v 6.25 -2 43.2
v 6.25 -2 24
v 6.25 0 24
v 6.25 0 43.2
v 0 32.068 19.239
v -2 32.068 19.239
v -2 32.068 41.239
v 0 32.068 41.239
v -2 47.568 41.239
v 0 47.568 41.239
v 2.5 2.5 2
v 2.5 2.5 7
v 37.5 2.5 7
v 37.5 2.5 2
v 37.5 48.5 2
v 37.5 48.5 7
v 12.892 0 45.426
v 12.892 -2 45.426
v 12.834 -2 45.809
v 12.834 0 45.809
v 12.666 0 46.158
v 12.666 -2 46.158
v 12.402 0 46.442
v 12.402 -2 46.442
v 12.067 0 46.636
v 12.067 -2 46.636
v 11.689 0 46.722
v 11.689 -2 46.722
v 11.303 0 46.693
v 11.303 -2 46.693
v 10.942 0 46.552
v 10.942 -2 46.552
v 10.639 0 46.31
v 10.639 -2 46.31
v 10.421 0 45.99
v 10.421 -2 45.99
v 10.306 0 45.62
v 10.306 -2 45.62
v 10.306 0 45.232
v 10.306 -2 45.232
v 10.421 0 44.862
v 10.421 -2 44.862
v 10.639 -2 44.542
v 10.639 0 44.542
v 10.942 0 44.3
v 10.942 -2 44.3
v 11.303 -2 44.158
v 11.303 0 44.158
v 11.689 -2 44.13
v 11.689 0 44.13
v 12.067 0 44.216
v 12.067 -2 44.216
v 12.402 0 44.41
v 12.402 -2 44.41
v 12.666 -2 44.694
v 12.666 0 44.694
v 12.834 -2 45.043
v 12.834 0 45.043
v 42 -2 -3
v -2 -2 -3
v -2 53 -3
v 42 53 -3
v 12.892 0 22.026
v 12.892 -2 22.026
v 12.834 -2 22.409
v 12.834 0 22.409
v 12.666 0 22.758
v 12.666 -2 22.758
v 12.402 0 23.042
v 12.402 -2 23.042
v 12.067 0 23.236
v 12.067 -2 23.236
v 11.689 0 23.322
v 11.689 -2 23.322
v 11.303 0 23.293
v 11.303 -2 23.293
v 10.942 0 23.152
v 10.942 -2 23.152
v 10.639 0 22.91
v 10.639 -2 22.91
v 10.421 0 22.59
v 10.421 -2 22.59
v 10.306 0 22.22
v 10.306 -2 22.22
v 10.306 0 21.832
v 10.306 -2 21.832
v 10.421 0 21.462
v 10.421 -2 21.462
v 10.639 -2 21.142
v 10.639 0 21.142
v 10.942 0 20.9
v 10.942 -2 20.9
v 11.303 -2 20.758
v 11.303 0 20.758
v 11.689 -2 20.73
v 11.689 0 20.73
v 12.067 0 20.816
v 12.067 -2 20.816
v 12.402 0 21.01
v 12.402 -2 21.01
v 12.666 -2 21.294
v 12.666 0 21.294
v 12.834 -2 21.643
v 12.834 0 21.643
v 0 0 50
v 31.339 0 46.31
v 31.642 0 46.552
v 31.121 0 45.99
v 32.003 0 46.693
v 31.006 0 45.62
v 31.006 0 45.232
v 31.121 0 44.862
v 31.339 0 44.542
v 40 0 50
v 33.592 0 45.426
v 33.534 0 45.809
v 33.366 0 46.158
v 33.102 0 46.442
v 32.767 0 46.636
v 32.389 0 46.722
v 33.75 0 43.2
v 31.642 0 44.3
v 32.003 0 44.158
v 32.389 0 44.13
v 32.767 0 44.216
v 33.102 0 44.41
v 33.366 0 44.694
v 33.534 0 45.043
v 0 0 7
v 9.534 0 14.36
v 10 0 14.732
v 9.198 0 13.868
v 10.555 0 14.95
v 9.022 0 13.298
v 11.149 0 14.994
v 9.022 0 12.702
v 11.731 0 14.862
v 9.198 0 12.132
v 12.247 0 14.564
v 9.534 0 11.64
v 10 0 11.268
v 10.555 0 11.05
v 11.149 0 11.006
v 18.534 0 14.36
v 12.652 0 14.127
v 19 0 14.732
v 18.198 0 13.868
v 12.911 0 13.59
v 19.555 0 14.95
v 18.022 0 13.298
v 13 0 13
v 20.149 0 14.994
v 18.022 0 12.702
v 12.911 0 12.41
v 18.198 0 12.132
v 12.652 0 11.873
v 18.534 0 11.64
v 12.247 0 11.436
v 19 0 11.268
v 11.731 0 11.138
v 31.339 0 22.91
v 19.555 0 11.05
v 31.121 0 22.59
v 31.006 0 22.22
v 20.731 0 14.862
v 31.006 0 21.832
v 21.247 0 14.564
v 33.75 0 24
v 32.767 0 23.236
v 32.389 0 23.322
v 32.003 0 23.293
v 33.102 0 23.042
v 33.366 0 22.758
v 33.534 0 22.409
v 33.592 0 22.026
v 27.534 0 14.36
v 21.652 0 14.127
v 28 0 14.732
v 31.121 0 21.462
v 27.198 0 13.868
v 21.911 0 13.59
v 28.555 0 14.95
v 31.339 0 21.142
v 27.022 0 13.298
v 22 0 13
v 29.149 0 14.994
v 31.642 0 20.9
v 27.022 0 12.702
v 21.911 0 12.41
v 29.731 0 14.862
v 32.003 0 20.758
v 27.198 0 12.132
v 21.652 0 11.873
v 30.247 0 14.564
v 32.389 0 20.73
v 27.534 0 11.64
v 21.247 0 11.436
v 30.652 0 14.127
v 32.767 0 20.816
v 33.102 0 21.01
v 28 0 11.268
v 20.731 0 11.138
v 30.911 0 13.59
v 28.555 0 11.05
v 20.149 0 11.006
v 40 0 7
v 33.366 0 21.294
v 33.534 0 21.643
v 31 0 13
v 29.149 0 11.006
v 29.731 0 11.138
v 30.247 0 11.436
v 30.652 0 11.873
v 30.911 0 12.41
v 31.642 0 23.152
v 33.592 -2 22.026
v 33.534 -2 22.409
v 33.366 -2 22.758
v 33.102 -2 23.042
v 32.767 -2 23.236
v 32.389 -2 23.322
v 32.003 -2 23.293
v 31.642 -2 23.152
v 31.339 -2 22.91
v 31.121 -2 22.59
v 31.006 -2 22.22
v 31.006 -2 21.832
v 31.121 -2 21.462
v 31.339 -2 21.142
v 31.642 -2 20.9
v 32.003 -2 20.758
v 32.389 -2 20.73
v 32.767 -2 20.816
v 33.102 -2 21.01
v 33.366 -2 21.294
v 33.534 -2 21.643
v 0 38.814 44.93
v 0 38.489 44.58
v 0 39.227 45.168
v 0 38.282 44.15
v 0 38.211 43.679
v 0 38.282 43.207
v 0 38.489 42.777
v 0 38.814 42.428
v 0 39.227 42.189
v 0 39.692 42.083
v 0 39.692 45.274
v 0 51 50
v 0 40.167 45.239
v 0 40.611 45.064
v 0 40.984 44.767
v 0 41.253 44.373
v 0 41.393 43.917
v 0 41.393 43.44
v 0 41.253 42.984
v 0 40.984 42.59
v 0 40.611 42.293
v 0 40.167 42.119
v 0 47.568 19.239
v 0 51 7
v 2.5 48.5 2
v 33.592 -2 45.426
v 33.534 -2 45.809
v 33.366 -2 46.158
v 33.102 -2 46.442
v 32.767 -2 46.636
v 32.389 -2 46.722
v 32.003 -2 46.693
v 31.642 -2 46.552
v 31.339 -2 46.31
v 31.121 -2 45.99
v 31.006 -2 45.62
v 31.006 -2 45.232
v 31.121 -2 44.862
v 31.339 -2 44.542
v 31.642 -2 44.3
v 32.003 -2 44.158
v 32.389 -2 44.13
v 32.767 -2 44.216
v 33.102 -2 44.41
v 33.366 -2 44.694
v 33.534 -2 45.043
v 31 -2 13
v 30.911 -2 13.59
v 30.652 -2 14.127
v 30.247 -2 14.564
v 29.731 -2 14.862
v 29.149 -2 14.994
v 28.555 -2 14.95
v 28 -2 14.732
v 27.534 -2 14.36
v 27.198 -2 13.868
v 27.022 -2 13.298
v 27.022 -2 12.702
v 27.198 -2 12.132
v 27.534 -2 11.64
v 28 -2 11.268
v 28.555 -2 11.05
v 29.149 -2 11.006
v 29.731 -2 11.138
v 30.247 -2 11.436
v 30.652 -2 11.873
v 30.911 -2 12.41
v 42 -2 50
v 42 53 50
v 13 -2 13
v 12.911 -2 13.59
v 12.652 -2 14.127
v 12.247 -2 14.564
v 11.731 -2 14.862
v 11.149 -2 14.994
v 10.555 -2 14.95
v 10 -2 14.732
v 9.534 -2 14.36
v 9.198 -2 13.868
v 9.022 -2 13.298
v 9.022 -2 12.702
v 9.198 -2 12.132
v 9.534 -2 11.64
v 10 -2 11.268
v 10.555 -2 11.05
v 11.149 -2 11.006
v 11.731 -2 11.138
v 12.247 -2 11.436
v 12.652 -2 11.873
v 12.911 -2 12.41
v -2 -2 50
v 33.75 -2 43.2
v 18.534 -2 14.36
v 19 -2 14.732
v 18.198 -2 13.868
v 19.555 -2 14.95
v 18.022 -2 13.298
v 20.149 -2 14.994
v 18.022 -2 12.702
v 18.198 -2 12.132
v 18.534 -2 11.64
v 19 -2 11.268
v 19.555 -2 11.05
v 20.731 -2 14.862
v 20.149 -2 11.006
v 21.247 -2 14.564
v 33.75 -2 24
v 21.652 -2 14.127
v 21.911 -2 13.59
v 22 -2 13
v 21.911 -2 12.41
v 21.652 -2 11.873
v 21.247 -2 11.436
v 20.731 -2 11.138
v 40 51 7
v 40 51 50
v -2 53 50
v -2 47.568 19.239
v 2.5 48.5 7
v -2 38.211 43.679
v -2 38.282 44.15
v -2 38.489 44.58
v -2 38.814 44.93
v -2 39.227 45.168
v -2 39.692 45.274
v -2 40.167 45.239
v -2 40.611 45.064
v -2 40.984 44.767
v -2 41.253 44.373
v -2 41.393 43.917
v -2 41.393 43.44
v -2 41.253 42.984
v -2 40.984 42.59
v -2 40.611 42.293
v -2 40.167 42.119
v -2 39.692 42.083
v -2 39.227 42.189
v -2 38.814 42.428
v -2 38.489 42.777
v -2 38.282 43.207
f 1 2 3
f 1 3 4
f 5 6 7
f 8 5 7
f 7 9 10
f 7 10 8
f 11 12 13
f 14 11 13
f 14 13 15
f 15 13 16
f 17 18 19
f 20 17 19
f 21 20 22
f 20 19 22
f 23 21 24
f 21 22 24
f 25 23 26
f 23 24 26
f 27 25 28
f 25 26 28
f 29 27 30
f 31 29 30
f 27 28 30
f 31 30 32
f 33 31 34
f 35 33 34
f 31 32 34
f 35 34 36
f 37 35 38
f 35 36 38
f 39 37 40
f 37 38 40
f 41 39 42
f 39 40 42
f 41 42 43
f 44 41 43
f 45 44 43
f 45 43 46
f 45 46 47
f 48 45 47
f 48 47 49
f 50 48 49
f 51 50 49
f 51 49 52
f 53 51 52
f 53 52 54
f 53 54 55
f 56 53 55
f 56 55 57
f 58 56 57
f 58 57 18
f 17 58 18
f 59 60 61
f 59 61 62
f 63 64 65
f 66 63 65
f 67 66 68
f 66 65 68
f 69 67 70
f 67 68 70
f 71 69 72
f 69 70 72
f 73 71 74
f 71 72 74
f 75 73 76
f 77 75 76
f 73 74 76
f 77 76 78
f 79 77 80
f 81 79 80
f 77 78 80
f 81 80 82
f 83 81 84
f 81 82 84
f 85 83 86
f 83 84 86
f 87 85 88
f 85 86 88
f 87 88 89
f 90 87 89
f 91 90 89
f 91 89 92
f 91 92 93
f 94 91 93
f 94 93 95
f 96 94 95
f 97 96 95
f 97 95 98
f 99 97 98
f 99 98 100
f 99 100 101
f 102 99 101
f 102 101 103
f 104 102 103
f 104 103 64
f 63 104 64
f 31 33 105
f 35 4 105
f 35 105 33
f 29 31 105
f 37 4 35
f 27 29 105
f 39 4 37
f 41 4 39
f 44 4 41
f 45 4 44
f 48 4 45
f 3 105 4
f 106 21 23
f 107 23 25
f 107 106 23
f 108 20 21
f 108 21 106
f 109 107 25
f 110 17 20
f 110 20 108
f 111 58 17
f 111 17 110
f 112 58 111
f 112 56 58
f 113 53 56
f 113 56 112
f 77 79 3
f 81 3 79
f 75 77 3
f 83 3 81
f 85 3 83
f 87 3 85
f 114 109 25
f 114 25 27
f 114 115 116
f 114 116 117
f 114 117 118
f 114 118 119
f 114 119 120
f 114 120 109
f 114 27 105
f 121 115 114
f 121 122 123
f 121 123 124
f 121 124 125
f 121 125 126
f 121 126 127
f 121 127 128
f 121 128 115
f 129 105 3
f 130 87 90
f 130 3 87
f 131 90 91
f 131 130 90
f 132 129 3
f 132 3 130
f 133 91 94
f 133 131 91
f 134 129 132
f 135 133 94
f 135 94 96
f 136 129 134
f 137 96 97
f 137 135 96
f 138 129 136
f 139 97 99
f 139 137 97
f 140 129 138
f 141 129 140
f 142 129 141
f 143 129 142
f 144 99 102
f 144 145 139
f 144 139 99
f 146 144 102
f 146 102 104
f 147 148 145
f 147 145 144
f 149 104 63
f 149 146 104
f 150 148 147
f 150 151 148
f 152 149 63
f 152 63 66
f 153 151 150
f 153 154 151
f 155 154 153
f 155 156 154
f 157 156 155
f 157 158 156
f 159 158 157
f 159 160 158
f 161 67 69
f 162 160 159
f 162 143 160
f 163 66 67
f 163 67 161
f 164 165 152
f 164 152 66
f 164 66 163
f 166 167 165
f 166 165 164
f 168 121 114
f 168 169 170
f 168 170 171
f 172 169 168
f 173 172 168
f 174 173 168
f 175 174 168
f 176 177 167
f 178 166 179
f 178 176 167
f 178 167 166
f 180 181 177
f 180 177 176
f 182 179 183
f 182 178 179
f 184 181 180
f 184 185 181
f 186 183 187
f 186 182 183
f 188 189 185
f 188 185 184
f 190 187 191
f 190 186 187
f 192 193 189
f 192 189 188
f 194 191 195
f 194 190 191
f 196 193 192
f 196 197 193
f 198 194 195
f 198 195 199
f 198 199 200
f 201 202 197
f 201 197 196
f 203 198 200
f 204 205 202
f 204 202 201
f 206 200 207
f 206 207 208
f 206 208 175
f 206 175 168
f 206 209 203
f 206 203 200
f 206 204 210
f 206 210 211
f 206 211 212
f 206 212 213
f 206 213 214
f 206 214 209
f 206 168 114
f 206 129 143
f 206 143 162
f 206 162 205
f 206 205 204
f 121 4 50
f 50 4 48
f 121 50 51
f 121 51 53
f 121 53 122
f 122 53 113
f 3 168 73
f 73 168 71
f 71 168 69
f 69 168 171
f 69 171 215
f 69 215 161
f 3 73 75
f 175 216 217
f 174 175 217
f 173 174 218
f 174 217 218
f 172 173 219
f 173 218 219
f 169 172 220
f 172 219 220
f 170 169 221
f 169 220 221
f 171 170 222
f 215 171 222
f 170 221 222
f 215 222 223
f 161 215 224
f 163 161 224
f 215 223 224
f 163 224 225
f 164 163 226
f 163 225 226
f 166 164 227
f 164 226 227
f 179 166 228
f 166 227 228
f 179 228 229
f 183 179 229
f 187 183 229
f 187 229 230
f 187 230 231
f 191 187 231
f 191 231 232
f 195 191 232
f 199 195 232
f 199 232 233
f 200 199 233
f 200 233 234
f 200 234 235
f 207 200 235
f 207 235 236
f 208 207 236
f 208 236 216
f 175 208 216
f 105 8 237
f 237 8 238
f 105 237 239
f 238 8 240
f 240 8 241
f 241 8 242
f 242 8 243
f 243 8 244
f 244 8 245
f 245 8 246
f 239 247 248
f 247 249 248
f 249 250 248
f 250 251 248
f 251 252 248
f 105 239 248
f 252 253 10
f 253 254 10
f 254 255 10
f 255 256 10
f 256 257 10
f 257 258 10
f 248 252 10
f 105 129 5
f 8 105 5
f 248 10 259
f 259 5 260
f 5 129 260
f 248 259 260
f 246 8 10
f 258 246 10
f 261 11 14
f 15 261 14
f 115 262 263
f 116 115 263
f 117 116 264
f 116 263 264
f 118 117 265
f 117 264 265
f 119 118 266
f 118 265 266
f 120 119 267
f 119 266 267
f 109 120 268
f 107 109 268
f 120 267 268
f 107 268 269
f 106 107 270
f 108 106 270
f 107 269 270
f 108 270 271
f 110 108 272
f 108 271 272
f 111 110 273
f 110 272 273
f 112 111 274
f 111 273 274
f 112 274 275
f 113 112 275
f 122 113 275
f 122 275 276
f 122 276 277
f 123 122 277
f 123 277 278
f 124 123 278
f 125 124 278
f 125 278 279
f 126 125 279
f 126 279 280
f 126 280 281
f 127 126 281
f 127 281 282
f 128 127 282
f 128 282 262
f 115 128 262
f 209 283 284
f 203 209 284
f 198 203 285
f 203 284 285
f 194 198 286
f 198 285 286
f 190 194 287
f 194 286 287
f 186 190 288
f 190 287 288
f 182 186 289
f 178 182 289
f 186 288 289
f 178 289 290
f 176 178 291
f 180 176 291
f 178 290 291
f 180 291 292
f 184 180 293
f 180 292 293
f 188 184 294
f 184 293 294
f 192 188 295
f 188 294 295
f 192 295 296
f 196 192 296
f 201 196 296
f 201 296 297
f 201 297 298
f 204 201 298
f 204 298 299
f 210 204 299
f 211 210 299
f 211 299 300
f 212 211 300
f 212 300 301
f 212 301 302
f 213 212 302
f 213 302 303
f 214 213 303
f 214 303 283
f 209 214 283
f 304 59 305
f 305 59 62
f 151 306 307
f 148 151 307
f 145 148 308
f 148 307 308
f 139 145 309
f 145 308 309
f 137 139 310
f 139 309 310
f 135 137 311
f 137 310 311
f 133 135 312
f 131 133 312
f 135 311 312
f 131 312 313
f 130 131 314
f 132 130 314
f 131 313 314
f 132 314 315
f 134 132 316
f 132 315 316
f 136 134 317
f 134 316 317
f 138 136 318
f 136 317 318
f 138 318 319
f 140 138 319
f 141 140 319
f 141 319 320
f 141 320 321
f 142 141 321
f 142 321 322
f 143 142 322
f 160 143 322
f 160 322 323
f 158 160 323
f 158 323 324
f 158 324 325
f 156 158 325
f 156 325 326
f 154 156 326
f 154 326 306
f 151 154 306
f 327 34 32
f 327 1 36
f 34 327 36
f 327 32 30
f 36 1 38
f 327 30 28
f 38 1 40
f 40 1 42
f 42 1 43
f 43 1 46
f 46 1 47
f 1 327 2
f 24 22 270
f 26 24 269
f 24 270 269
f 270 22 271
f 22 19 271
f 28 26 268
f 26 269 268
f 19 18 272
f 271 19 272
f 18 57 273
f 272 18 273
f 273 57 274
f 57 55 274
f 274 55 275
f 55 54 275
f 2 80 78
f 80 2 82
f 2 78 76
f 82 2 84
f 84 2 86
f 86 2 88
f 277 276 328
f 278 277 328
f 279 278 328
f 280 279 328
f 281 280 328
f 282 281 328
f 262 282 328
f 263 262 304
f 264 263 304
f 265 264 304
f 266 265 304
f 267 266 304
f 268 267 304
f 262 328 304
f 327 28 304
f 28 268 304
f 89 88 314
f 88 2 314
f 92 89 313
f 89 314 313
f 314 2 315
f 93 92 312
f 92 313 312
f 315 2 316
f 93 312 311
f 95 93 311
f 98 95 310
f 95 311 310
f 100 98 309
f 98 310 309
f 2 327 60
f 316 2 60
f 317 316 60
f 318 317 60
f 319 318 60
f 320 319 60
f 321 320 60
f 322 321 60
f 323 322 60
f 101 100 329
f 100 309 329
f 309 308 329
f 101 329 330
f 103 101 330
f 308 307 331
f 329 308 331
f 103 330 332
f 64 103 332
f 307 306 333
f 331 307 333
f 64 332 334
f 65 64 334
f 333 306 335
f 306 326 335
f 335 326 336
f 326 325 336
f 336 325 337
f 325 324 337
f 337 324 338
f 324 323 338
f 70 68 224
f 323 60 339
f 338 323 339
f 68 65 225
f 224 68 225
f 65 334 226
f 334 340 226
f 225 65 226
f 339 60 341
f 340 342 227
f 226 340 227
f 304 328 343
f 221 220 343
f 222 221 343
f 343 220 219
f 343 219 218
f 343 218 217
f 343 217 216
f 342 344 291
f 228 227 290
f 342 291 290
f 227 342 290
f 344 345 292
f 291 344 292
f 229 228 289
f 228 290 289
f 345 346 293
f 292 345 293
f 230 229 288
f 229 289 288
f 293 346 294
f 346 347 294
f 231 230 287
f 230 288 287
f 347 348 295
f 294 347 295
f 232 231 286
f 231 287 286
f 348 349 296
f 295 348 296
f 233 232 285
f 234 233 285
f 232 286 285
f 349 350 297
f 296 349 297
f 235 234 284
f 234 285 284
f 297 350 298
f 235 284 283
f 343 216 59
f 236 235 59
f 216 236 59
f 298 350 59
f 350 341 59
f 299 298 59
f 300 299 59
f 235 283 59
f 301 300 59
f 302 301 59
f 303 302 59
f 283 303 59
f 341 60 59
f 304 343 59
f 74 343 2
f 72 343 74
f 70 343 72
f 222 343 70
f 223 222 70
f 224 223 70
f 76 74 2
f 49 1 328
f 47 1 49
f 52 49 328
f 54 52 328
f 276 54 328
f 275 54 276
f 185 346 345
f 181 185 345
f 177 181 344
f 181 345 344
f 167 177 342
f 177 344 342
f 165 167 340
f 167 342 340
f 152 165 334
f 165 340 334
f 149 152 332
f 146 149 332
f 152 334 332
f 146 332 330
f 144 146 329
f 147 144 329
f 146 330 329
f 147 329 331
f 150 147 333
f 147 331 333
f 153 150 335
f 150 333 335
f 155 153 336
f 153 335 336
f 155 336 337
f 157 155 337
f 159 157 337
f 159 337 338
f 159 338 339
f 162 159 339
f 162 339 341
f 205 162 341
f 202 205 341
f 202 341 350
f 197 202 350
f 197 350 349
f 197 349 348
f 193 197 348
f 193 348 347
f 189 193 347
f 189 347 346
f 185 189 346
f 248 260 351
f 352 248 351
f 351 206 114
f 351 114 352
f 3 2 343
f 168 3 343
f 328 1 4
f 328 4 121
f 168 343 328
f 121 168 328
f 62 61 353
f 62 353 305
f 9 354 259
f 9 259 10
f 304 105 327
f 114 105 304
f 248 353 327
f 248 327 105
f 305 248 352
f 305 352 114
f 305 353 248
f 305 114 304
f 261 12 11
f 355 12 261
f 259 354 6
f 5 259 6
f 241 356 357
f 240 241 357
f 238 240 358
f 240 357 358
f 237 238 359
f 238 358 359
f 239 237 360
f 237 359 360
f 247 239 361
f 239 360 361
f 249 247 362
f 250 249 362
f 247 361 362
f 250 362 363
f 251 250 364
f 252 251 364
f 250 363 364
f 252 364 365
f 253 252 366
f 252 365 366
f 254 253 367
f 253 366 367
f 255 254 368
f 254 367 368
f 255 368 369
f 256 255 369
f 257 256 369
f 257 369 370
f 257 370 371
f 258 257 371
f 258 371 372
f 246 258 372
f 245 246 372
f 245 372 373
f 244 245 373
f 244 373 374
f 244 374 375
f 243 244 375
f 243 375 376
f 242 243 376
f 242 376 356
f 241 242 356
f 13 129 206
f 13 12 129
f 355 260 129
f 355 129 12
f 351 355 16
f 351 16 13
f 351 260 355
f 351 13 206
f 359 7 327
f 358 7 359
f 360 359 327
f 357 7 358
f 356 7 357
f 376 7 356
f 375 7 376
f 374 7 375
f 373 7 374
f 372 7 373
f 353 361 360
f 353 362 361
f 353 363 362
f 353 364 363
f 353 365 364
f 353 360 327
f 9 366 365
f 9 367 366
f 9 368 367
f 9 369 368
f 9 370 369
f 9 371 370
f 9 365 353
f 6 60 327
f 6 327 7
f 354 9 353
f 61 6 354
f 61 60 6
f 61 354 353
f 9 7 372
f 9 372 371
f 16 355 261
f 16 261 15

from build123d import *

# Parameters (mm, degrees)
SKETCH_W        = 40
SKETCH_H        = 51
PAD_DEPTH       = 7
SKETCH001_W     = 35
SKETCH001_H     = 46
POCKET_DEPTH    = 5
SKETCH002_W     = 44
SKETCH002_H     = 55
PAD001_DEPTH    = 3
SKETCH003_W     = 44
SKETCH003_H     = 55
SKETCH003_W_2   = 40
SKETCH003_H_2   = 51
PAD002_DEPTH    = 50
SKETCH004_R     = 1.3
SKETCH004_W     = 27.5
SKETCH004_H     = 19.2
POCKET001_DEPTH = 5
SKETCH005_R     = 2
POCKET002_DEPTH = 5
SKETCH006_R     = 1.6
SKETCH006_W     = 15.5
SKETCH006_H     = 22
POCKET003_DEPTH = 5


with BuildPart() as part:
    # Sketch → Pad (new body)
    with BuildSketch(Plane.XY):
        with Locations((20, 25.5)):
            Rectangle(SKETCH_W, SKETCH_H)
    extrude(amount=PAD_DEPTH)

    # Sketch001 → Pocket (cut)
    with BuildSketch(Plane.XY.offset(7)):
        with Locations((20, 25.5)):
            Rectangle(SKETCH001_W, SKETCH001_H)
    extrude(amount=-POCKET_DEPTH, mode=Mode.SUBTRACT)

    # Sketch002 → Pad001 (new body)
    with BuildSketch(Plane(origin=(0, 0, 0), x_dir=(1, 0, 0), z_dir=(0, 0, -1))):
        with Locations((20, -25.5)):
            Rectangle(SKETCH002_W, SKETCH002_H)
    extrude(amount=PAD001_DEPTH)

    # Sketch003 → Pad002 (new body)
    with BuildSketch(Plane.XY):
        with Locations((20, 25.5)):
            Rectangle(SKETCH003_W, SKETCH003_H)
        with Locations((20, 25.5)):
            Rectangle(SKETCH003_W_2, SKETCH003_H_2, mode=Mode.SUBTRACT)
    extrude(amount=PAD002_DEPTH)

    # Sketch004 → Pocket001 (cut)
    with BuildSketch(Plane.XZ.offset(2)):
        with Locations((11.591859, 22.0259)):
            Circle(SKETCH004_R)
        with Locations((32.291859, 22.0259)):
            Circle(SKETCH004_R)
        with Locations((11.591859, 45.4259)):
            Circle(SKETCH004_R)
        with Locations((32.291859, 45.4259)):
            Circle(SKETCH004_R)
        with Locations((20, 33.6)):
            Rectangle(SKETCH004_W, SKETCH004_H)
    extrude(amount=-POCKET001_DEPTH, mode=Mode.SUBTRACT)

    # Sketch005 → Pocket002 (cut)
    with BuildSketch(Plane.XZ.offset(2)):
        with Locations((11, 13)):
            Circle(SKETCH005_R)
        with Locations((20, 13)):
            Circle(SKETCH005_R)
        with Locations((29, 13)):
            Circle(SKETCH005_R)
    extrude(amount=-POCKET002_DEPTH, mode=Mode.SUBTRACT)

    # Sketch006 → Pocket003 (cut)
    with BuildSketch(Plane(origin=(-2, 0, 0), x_dir=(0, -1, 0), z_dir=(-1, 0, 0))):
        with Locations((-39.811333, 43.678651)):
            Circle(SKETCH006_R)
        with Locations((-39.817526, 30.238866)):
            Rectangle(SKETCH006_W, SKETCH006_H)
    extrude(amount=-POCKET003_DEPTH, mode=Mode.SUBTRACT)


solid = part.part
